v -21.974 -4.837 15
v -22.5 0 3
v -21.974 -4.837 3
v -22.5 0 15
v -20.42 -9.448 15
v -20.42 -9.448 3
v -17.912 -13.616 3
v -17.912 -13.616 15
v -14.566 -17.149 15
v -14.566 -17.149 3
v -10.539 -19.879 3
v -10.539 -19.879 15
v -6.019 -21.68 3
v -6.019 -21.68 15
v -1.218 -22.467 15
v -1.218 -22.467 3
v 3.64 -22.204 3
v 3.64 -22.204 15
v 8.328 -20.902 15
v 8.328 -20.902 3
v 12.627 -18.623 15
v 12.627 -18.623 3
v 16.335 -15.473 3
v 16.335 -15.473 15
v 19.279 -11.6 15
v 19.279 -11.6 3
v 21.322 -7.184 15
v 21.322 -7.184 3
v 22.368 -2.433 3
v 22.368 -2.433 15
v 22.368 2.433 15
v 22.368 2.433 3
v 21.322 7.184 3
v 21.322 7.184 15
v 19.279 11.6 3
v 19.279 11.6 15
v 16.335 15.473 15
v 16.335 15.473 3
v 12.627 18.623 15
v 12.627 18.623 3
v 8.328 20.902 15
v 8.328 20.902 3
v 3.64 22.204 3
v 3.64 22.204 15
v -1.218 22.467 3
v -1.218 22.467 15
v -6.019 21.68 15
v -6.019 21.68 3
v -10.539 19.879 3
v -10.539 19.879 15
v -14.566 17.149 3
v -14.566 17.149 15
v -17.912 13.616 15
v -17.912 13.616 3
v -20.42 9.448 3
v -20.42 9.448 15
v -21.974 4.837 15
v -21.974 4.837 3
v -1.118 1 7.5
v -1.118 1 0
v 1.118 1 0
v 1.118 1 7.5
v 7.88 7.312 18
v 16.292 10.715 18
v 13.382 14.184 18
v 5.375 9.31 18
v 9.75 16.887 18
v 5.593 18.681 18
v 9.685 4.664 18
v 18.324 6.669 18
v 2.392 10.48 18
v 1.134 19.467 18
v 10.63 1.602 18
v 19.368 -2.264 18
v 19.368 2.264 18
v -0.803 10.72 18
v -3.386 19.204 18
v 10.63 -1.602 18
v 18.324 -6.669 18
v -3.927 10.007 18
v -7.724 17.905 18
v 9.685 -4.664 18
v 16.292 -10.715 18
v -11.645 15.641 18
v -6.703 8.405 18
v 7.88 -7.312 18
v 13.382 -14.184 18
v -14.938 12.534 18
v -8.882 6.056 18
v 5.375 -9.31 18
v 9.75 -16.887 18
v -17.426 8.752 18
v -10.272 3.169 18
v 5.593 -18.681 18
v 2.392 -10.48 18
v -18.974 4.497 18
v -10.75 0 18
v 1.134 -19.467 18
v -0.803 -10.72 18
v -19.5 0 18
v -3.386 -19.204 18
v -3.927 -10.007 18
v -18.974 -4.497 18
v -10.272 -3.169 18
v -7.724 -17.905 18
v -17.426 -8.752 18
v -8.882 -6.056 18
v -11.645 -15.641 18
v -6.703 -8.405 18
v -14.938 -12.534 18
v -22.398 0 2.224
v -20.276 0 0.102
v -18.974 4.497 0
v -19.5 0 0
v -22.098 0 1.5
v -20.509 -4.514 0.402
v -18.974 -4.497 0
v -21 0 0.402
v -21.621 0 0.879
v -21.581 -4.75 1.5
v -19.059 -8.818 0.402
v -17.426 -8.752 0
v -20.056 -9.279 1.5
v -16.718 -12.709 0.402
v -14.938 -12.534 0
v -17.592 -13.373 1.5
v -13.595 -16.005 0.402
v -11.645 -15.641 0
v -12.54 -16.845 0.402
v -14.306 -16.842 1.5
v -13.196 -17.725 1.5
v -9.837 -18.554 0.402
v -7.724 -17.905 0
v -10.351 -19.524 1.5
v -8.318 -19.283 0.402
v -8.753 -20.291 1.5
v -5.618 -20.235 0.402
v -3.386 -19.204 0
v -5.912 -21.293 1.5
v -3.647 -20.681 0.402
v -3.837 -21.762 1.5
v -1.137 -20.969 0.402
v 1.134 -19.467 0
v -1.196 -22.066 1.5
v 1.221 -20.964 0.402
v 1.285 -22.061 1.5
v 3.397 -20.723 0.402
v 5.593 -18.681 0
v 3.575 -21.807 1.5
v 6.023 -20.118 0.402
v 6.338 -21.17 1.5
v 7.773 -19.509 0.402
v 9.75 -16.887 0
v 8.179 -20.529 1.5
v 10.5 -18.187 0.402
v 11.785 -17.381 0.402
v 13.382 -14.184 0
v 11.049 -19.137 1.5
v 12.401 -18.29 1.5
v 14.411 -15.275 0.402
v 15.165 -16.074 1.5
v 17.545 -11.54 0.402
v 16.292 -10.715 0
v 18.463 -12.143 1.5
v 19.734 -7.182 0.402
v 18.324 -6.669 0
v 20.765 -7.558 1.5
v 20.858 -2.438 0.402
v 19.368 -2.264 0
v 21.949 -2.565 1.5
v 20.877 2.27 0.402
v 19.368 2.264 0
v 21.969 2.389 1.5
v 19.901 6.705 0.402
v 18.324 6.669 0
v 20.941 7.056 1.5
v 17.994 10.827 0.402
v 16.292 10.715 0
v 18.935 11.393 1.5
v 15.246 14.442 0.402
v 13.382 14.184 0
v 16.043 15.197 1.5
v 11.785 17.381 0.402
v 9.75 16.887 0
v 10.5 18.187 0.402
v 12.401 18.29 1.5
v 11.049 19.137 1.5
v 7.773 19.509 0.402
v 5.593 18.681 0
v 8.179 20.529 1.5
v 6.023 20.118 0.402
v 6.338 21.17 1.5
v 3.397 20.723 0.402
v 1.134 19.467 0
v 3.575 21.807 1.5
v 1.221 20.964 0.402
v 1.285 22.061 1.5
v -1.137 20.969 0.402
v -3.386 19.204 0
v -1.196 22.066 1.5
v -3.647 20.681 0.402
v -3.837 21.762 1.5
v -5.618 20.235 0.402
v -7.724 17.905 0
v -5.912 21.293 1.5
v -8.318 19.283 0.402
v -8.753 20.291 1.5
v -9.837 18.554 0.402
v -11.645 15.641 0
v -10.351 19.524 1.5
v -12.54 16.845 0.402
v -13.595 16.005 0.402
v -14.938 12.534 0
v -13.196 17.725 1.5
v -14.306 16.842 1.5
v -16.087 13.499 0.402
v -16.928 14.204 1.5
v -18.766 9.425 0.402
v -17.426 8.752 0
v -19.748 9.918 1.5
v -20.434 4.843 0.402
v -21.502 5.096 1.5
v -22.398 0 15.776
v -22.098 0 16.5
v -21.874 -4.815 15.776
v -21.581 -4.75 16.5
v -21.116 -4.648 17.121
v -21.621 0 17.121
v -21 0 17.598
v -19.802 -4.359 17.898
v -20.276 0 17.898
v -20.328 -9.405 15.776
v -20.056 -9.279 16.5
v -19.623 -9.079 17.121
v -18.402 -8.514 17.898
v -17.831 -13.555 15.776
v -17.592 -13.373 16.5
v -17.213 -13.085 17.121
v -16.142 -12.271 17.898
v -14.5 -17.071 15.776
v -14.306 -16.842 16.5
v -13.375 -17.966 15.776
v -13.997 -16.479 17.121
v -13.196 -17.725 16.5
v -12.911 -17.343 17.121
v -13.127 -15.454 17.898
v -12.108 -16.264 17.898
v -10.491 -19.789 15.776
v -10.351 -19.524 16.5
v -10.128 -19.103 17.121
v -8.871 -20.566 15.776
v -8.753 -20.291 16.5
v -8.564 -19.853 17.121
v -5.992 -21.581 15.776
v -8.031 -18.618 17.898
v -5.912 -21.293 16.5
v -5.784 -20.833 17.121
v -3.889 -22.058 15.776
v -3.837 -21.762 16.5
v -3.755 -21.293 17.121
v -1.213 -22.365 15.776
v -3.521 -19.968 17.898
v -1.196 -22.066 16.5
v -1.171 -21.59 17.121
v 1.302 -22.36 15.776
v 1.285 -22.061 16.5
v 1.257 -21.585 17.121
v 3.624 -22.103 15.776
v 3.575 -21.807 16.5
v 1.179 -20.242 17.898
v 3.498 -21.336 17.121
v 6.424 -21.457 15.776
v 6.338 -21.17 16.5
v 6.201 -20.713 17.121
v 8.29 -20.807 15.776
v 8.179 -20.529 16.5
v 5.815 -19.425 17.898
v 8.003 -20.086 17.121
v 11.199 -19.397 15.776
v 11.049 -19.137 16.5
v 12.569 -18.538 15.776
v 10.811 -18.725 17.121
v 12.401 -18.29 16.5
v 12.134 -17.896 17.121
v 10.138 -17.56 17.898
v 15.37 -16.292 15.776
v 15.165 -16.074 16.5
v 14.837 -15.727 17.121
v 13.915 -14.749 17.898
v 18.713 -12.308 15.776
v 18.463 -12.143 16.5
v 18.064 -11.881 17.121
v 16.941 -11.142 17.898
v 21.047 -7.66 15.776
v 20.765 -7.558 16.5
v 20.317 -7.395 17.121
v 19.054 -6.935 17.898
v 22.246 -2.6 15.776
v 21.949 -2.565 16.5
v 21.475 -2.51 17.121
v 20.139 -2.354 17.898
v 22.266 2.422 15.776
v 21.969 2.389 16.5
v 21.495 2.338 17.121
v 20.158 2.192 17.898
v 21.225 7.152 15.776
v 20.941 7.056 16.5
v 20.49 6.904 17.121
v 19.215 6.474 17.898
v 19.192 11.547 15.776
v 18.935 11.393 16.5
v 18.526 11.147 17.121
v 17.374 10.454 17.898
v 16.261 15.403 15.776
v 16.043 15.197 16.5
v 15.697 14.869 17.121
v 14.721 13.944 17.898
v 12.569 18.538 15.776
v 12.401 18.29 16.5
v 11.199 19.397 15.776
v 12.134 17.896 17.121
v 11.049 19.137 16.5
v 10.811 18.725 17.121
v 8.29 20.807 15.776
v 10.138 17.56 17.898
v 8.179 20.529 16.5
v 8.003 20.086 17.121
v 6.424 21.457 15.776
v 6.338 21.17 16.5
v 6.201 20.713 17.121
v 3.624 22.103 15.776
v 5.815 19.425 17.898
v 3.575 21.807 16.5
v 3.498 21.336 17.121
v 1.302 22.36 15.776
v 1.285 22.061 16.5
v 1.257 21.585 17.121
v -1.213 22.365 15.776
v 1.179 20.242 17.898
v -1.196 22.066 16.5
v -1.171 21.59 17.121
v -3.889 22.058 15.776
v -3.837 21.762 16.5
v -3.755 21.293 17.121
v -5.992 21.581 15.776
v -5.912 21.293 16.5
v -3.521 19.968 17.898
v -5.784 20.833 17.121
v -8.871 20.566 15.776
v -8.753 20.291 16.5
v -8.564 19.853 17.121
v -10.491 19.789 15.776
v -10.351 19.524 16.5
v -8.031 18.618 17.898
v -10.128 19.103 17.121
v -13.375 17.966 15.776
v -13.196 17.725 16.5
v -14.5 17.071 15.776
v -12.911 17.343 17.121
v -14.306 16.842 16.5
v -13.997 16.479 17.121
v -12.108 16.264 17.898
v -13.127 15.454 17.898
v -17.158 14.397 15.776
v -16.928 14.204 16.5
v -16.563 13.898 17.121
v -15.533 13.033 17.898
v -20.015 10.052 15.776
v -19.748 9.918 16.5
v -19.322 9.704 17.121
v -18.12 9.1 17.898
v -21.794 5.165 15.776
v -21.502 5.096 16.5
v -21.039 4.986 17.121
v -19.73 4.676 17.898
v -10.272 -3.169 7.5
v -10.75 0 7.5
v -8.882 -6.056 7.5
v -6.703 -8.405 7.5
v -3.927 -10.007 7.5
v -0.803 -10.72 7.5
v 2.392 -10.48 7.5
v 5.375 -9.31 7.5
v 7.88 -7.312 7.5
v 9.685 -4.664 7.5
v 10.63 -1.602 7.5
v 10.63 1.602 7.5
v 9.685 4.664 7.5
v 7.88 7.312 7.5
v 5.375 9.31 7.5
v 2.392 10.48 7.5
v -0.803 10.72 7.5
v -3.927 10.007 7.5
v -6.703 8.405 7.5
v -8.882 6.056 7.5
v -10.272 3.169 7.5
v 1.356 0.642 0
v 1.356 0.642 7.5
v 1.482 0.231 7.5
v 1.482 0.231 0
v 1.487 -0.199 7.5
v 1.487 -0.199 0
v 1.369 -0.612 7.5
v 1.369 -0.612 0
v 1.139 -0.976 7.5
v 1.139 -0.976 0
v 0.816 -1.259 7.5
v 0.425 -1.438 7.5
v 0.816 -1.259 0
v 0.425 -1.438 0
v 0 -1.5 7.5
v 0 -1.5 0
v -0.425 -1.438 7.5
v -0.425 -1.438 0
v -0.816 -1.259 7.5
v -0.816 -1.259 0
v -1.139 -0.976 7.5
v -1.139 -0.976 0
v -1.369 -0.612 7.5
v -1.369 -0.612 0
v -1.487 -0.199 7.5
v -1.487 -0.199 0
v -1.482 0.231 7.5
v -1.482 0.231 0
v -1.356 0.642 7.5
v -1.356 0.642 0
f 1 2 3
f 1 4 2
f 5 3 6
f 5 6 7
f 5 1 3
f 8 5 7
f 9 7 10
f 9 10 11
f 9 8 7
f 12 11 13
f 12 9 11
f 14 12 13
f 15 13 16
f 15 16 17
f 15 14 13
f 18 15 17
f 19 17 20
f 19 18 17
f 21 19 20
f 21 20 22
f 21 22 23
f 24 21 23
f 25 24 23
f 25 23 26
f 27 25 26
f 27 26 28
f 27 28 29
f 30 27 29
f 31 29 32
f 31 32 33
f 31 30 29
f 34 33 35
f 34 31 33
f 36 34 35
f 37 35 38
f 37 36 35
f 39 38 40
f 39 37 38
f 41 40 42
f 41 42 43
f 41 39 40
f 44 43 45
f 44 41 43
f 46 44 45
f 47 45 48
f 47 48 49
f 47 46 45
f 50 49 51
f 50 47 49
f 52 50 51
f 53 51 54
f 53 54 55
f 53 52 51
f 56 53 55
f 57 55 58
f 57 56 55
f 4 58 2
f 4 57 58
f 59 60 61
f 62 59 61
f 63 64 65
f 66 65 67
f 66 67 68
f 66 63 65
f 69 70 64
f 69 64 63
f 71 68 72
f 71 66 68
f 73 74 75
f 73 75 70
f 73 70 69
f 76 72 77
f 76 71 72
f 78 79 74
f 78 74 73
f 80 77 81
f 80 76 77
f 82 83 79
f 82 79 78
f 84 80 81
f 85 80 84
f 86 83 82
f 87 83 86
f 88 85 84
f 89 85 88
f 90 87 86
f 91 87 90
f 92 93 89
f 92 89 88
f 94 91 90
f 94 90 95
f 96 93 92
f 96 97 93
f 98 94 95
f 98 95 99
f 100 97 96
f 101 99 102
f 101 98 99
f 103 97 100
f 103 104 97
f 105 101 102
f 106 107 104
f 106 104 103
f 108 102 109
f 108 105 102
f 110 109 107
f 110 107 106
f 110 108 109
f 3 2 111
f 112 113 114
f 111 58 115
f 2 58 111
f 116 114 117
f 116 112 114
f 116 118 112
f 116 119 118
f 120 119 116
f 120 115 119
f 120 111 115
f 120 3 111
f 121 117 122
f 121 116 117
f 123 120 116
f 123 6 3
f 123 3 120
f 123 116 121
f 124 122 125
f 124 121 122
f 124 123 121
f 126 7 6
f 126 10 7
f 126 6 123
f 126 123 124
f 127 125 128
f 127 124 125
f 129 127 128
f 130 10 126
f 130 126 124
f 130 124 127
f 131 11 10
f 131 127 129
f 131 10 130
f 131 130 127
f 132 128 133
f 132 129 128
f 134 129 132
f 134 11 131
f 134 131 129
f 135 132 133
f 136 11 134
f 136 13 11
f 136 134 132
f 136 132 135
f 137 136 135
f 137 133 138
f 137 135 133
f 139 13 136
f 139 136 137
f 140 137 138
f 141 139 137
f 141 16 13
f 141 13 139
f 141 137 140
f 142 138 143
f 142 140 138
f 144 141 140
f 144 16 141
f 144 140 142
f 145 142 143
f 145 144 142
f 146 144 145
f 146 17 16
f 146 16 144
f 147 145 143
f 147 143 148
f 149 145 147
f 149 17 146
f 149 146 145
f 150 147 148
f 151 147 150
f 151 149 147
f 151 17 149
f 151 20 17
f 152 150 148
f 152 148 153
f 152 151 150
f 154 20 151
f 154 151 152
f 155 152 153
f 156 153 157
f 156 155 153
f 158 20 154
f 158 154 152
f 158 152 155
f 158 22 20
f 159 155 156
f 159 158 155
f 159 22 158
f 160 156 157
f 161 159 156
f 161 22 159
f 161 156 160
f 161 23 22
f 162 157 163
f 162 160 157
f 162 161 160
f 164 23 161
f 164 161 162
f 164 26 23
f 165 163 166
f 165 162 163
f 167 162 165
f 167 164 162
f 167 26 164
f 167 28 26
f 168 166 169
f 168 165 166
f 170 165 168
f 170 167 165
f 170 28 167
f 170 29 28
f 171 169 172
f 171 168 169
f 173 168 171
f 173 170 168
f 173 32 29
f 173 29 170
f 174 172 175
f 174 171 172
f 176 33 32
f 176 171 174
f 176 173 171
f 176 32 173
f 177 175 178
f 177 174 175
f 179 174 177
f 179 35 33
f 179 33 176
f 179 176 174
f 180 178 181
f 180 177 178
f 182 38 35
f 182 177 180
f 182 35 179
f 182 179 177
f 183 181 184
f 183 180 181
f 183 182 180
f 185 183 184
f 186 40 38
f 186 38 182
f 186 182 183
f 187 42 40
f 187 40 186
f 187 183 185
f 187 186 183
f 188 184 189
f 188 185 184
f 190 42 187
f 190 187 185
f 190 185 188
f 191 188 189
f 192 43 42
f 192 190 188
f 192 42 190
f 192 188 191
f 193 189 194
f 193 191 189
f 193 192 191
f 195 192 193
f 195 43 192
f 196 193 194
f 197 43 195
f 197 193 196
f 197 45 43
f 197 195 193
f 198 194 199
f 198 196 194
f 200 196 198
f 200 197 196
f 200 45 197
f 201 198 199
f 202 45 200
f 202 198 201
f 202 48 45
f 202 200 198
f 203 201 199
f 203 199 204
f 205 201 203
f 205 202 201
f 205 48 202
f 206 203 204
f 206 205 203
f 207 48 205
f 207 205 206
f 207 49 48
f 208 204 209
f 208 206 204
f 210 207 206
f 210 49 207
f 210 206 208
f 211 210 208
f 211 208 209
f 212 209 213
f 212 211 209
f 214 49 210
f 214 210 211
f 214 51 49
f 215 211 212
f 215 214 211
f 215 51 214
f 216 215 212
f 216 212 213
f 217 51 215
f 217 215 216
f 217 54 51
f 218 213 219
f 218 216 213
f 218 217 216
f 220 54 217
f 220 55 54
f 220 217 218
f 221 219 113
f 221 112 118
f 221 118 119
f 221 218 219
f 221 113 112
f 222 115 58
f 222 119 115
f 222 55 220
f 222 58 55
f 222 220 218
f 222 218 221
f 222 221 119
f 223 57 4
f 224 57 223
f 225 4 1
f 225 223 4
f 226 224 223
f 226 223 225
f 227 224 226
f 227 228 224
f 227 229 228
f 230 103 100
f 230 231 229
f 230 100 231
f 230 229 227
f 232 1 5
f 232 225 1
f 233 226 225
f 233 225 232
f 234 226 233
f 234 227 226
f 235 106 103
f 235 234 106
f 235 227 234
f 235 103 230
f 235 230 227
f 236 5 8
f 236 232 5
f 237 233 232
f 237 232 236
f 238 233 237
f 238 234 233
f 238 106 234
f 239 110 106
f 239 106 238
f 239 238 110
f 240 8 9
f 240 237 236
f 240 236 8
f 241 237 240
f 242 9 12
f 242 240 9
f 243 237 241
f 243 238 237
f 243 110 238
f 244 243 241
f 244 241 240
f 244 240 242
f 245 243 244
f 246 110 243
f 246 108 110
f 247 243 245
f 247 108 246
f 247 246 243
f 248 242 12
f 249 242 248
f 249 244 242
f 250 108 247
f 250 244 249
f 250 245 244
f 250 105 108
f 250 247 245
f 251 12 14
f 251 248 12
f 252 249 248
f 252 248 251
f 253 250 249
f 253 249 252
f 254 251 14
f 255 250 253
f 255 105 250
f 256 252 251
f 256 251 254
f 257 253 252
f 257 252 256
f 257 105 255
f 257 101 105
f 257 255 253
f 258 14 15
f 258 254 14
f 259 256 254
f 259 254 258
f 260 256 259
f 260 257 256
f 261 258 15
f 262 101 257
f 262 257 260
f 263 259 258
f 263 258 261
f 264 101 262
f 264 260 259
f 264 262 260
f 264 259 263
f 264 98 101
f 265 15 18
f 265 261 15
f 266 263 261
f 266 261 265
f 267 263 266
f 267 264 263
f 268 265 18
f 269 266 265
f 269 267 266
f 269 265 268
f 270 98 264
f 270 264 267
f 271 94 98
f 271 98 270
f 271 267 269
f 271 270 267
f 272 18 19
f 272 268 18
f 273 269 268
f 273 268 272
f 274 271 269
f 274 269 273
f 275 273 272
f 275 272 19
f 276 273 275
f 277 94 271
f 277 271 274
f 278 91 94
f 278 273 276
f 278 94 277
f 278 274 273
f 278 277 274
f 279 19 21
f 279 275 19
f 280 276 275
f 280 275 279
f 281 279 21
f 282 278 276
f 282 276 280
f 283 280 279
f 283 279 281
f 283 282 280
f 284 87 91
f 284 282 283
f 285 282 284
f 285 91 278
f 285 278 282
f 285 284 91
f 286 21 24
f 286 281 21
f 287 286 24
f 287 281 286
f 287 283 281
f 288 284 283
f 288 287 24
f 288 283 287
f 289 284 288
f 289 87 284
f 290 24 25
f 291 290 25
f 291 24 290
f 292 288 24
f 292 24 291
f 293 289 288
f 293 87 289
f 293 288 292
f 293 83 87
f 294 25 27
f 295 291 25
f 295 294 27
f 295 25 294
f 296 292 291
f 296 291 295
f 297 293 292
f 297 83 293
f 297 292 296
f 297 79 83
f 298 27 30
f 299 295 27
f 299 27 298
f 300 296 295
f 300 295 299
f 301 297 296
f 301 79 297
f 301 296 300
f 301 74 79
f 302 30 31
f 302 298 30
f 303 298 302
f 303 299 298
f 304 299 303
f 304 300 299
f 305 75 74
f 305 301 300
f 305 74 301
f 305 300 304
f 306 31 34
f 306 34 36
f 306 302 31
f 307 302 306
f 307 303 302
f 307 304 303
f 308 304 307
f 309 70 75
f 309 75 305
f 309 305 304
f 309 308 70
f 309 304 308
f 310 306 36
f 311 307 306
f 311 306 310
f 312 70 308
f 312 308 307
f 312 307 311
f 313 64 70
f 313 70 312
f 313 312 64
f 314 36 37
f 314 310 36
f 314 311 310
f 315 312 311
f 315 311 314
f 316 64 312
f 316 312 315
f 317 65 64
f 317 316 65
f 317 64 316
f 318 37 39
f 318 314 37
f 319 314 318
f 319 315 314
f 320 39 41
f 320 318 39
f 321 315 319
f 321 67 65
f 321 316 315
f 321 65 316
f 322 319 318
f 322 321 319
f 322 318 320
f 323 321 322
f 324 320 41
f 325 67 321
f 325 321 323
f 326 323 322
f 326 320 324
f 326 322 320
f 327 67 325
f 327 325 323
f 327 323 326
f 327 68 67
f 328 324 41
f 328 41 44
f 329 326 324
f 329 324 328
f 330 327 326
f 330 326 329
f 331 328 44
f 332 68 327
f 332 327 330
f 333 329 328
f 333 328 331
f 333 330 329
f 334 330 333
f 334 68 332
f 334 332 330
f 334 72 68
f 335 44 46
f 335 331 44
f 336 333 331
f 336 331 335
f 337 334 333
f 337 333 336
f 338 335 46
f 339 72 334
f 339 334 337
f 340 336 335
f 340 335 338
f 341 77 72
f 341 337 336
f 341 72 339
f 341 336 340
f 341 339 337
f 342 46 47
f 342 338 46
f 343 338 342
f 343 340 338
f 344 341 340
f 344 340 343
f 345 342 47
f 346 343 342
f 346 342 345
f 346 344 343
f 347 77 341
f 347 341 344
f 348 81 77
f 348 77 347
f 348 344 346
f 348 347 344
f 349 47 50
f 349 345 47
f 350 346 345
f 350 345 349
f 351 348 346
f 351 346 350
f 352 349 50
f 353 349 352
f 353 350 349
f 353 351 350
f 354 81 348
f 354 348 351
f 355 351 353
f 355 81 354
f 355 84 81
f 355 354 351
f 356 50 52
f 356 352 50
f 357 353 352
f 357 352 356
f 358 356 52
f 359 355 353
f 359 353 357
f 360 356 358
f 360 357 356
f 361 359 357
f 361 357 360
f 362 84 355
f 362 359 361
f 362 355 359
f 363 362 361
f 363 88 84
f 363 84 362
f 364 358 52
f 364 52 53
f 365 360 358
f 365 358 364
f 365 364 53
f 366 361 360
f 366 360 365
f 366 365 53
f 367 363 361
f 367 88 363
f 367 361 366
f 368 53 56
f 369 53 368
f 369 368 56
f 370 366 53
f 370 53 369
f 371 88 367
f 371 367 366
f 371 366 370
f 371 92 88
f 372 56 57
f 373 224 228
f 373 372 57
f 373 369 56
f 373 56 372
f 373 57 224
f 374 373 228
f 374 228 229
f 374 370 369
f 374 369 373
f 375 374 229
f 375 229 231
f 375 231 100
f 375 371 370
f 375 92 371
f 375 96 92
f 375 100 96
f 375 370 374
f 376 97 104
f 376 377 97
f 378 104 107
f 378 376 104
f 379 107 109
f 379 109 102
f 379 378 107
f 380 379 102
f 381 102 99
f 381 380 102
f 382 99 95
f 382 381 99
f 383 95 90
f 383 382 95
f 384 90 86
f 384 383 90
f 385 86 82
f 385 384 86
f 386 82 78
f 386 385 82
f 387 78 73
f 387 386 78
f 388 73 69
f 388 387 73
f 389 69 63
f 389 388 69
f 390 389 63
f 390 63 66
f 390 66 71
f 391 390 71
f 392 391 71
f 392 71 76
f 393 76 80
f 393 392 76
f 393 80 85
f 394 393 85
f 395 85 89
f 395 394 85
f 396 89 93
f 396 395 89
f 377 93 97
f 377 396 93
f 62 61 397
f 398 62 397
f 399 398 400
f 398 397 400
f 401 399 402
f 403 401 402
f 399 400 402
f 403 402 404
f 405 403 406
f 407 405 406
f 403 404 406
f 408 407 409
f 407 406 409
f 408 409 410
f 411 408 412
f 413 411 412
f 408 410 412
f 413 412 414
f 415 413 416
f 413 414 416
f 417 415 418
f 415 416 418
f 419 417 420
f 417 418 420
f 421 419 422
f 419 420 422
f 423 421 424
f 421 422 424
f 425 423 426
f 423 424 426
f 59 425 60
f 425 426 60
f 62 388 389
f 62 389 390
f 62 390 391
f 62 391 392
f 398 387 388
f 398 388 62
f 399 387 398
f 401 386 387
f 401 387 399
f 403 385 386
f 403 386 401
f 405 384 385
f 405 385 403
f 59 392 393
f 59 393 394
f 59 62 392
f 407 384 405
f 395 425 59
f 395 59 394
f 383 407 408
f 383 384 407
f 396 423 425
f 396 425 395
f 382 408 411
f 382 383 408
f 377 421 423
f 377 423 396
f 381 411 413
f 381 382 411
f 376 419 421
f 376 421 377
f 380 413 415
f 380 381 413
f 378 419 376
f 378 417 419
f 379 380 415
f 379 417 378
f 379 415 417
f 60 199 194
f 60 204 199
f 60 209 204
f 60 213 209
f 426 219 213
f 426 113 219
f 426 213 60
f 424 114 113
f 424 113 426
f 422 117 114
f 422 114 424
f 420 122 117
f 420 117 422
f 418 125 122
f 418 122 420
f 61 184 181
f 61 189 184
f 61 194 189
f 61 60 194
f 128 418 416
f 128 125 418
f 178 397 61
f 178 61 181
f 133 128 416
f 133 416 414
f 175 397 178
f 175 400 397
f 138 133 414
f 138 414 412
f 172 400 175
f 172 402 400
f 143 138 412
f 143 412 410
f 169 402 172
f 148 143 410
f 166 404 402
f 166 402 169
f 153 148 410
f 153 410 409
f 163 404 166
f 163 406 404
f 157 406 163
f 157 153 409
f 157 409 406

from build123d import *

# Parameters (mm, degrees)
CUT_EXTRUDE1_DEPTH = 37.558172882


with BuildPart() as part:
    # Sketch1 → Revolve1 (revolve)
    with BuildSketch(Plane(origin=(0, 0, 0), x_dir=(1, 0, 0), z_dir=(0, 1, 0))):
        with BuildLine():
            Line((0, 0), (19.5, 0))
            ThreePointArc((19.5, 0), (21.621320344, -0.878679656), (22.5, -3))
            Line((22.5, -3), (22.5, -15))
            ThreePointArc((22.5, -15), (21.621320344, -17.121320344), (19.5, -18))
            Line((19.5, -18), (10.75, -18))
            Line((10.75, -18), (10.75, -7.5))
            Line((10.75, -7.5), (0, -7.5))
            Line((0, -7.5), (0, 0))
        make_face()
    revolve(axis=Axis((0, 0, -41.848991251), (0, 0, 1)))

    # Sketch2 → Cut-Extrude1 (cut, through all)
    with BuildSketch(Plane.XY):
        with BuildLine():
            Line((-1.118033989, 1), (1.118033989, 1))
            ThreePointArc((1.118033989, 1), (0, -1.5), (-1.118033989, 1))
        make_face()
    extrude(amount=CUT_EXTRUDE1_DEPTH, mode=Mode.SUBTRACT)


solid = part.part
